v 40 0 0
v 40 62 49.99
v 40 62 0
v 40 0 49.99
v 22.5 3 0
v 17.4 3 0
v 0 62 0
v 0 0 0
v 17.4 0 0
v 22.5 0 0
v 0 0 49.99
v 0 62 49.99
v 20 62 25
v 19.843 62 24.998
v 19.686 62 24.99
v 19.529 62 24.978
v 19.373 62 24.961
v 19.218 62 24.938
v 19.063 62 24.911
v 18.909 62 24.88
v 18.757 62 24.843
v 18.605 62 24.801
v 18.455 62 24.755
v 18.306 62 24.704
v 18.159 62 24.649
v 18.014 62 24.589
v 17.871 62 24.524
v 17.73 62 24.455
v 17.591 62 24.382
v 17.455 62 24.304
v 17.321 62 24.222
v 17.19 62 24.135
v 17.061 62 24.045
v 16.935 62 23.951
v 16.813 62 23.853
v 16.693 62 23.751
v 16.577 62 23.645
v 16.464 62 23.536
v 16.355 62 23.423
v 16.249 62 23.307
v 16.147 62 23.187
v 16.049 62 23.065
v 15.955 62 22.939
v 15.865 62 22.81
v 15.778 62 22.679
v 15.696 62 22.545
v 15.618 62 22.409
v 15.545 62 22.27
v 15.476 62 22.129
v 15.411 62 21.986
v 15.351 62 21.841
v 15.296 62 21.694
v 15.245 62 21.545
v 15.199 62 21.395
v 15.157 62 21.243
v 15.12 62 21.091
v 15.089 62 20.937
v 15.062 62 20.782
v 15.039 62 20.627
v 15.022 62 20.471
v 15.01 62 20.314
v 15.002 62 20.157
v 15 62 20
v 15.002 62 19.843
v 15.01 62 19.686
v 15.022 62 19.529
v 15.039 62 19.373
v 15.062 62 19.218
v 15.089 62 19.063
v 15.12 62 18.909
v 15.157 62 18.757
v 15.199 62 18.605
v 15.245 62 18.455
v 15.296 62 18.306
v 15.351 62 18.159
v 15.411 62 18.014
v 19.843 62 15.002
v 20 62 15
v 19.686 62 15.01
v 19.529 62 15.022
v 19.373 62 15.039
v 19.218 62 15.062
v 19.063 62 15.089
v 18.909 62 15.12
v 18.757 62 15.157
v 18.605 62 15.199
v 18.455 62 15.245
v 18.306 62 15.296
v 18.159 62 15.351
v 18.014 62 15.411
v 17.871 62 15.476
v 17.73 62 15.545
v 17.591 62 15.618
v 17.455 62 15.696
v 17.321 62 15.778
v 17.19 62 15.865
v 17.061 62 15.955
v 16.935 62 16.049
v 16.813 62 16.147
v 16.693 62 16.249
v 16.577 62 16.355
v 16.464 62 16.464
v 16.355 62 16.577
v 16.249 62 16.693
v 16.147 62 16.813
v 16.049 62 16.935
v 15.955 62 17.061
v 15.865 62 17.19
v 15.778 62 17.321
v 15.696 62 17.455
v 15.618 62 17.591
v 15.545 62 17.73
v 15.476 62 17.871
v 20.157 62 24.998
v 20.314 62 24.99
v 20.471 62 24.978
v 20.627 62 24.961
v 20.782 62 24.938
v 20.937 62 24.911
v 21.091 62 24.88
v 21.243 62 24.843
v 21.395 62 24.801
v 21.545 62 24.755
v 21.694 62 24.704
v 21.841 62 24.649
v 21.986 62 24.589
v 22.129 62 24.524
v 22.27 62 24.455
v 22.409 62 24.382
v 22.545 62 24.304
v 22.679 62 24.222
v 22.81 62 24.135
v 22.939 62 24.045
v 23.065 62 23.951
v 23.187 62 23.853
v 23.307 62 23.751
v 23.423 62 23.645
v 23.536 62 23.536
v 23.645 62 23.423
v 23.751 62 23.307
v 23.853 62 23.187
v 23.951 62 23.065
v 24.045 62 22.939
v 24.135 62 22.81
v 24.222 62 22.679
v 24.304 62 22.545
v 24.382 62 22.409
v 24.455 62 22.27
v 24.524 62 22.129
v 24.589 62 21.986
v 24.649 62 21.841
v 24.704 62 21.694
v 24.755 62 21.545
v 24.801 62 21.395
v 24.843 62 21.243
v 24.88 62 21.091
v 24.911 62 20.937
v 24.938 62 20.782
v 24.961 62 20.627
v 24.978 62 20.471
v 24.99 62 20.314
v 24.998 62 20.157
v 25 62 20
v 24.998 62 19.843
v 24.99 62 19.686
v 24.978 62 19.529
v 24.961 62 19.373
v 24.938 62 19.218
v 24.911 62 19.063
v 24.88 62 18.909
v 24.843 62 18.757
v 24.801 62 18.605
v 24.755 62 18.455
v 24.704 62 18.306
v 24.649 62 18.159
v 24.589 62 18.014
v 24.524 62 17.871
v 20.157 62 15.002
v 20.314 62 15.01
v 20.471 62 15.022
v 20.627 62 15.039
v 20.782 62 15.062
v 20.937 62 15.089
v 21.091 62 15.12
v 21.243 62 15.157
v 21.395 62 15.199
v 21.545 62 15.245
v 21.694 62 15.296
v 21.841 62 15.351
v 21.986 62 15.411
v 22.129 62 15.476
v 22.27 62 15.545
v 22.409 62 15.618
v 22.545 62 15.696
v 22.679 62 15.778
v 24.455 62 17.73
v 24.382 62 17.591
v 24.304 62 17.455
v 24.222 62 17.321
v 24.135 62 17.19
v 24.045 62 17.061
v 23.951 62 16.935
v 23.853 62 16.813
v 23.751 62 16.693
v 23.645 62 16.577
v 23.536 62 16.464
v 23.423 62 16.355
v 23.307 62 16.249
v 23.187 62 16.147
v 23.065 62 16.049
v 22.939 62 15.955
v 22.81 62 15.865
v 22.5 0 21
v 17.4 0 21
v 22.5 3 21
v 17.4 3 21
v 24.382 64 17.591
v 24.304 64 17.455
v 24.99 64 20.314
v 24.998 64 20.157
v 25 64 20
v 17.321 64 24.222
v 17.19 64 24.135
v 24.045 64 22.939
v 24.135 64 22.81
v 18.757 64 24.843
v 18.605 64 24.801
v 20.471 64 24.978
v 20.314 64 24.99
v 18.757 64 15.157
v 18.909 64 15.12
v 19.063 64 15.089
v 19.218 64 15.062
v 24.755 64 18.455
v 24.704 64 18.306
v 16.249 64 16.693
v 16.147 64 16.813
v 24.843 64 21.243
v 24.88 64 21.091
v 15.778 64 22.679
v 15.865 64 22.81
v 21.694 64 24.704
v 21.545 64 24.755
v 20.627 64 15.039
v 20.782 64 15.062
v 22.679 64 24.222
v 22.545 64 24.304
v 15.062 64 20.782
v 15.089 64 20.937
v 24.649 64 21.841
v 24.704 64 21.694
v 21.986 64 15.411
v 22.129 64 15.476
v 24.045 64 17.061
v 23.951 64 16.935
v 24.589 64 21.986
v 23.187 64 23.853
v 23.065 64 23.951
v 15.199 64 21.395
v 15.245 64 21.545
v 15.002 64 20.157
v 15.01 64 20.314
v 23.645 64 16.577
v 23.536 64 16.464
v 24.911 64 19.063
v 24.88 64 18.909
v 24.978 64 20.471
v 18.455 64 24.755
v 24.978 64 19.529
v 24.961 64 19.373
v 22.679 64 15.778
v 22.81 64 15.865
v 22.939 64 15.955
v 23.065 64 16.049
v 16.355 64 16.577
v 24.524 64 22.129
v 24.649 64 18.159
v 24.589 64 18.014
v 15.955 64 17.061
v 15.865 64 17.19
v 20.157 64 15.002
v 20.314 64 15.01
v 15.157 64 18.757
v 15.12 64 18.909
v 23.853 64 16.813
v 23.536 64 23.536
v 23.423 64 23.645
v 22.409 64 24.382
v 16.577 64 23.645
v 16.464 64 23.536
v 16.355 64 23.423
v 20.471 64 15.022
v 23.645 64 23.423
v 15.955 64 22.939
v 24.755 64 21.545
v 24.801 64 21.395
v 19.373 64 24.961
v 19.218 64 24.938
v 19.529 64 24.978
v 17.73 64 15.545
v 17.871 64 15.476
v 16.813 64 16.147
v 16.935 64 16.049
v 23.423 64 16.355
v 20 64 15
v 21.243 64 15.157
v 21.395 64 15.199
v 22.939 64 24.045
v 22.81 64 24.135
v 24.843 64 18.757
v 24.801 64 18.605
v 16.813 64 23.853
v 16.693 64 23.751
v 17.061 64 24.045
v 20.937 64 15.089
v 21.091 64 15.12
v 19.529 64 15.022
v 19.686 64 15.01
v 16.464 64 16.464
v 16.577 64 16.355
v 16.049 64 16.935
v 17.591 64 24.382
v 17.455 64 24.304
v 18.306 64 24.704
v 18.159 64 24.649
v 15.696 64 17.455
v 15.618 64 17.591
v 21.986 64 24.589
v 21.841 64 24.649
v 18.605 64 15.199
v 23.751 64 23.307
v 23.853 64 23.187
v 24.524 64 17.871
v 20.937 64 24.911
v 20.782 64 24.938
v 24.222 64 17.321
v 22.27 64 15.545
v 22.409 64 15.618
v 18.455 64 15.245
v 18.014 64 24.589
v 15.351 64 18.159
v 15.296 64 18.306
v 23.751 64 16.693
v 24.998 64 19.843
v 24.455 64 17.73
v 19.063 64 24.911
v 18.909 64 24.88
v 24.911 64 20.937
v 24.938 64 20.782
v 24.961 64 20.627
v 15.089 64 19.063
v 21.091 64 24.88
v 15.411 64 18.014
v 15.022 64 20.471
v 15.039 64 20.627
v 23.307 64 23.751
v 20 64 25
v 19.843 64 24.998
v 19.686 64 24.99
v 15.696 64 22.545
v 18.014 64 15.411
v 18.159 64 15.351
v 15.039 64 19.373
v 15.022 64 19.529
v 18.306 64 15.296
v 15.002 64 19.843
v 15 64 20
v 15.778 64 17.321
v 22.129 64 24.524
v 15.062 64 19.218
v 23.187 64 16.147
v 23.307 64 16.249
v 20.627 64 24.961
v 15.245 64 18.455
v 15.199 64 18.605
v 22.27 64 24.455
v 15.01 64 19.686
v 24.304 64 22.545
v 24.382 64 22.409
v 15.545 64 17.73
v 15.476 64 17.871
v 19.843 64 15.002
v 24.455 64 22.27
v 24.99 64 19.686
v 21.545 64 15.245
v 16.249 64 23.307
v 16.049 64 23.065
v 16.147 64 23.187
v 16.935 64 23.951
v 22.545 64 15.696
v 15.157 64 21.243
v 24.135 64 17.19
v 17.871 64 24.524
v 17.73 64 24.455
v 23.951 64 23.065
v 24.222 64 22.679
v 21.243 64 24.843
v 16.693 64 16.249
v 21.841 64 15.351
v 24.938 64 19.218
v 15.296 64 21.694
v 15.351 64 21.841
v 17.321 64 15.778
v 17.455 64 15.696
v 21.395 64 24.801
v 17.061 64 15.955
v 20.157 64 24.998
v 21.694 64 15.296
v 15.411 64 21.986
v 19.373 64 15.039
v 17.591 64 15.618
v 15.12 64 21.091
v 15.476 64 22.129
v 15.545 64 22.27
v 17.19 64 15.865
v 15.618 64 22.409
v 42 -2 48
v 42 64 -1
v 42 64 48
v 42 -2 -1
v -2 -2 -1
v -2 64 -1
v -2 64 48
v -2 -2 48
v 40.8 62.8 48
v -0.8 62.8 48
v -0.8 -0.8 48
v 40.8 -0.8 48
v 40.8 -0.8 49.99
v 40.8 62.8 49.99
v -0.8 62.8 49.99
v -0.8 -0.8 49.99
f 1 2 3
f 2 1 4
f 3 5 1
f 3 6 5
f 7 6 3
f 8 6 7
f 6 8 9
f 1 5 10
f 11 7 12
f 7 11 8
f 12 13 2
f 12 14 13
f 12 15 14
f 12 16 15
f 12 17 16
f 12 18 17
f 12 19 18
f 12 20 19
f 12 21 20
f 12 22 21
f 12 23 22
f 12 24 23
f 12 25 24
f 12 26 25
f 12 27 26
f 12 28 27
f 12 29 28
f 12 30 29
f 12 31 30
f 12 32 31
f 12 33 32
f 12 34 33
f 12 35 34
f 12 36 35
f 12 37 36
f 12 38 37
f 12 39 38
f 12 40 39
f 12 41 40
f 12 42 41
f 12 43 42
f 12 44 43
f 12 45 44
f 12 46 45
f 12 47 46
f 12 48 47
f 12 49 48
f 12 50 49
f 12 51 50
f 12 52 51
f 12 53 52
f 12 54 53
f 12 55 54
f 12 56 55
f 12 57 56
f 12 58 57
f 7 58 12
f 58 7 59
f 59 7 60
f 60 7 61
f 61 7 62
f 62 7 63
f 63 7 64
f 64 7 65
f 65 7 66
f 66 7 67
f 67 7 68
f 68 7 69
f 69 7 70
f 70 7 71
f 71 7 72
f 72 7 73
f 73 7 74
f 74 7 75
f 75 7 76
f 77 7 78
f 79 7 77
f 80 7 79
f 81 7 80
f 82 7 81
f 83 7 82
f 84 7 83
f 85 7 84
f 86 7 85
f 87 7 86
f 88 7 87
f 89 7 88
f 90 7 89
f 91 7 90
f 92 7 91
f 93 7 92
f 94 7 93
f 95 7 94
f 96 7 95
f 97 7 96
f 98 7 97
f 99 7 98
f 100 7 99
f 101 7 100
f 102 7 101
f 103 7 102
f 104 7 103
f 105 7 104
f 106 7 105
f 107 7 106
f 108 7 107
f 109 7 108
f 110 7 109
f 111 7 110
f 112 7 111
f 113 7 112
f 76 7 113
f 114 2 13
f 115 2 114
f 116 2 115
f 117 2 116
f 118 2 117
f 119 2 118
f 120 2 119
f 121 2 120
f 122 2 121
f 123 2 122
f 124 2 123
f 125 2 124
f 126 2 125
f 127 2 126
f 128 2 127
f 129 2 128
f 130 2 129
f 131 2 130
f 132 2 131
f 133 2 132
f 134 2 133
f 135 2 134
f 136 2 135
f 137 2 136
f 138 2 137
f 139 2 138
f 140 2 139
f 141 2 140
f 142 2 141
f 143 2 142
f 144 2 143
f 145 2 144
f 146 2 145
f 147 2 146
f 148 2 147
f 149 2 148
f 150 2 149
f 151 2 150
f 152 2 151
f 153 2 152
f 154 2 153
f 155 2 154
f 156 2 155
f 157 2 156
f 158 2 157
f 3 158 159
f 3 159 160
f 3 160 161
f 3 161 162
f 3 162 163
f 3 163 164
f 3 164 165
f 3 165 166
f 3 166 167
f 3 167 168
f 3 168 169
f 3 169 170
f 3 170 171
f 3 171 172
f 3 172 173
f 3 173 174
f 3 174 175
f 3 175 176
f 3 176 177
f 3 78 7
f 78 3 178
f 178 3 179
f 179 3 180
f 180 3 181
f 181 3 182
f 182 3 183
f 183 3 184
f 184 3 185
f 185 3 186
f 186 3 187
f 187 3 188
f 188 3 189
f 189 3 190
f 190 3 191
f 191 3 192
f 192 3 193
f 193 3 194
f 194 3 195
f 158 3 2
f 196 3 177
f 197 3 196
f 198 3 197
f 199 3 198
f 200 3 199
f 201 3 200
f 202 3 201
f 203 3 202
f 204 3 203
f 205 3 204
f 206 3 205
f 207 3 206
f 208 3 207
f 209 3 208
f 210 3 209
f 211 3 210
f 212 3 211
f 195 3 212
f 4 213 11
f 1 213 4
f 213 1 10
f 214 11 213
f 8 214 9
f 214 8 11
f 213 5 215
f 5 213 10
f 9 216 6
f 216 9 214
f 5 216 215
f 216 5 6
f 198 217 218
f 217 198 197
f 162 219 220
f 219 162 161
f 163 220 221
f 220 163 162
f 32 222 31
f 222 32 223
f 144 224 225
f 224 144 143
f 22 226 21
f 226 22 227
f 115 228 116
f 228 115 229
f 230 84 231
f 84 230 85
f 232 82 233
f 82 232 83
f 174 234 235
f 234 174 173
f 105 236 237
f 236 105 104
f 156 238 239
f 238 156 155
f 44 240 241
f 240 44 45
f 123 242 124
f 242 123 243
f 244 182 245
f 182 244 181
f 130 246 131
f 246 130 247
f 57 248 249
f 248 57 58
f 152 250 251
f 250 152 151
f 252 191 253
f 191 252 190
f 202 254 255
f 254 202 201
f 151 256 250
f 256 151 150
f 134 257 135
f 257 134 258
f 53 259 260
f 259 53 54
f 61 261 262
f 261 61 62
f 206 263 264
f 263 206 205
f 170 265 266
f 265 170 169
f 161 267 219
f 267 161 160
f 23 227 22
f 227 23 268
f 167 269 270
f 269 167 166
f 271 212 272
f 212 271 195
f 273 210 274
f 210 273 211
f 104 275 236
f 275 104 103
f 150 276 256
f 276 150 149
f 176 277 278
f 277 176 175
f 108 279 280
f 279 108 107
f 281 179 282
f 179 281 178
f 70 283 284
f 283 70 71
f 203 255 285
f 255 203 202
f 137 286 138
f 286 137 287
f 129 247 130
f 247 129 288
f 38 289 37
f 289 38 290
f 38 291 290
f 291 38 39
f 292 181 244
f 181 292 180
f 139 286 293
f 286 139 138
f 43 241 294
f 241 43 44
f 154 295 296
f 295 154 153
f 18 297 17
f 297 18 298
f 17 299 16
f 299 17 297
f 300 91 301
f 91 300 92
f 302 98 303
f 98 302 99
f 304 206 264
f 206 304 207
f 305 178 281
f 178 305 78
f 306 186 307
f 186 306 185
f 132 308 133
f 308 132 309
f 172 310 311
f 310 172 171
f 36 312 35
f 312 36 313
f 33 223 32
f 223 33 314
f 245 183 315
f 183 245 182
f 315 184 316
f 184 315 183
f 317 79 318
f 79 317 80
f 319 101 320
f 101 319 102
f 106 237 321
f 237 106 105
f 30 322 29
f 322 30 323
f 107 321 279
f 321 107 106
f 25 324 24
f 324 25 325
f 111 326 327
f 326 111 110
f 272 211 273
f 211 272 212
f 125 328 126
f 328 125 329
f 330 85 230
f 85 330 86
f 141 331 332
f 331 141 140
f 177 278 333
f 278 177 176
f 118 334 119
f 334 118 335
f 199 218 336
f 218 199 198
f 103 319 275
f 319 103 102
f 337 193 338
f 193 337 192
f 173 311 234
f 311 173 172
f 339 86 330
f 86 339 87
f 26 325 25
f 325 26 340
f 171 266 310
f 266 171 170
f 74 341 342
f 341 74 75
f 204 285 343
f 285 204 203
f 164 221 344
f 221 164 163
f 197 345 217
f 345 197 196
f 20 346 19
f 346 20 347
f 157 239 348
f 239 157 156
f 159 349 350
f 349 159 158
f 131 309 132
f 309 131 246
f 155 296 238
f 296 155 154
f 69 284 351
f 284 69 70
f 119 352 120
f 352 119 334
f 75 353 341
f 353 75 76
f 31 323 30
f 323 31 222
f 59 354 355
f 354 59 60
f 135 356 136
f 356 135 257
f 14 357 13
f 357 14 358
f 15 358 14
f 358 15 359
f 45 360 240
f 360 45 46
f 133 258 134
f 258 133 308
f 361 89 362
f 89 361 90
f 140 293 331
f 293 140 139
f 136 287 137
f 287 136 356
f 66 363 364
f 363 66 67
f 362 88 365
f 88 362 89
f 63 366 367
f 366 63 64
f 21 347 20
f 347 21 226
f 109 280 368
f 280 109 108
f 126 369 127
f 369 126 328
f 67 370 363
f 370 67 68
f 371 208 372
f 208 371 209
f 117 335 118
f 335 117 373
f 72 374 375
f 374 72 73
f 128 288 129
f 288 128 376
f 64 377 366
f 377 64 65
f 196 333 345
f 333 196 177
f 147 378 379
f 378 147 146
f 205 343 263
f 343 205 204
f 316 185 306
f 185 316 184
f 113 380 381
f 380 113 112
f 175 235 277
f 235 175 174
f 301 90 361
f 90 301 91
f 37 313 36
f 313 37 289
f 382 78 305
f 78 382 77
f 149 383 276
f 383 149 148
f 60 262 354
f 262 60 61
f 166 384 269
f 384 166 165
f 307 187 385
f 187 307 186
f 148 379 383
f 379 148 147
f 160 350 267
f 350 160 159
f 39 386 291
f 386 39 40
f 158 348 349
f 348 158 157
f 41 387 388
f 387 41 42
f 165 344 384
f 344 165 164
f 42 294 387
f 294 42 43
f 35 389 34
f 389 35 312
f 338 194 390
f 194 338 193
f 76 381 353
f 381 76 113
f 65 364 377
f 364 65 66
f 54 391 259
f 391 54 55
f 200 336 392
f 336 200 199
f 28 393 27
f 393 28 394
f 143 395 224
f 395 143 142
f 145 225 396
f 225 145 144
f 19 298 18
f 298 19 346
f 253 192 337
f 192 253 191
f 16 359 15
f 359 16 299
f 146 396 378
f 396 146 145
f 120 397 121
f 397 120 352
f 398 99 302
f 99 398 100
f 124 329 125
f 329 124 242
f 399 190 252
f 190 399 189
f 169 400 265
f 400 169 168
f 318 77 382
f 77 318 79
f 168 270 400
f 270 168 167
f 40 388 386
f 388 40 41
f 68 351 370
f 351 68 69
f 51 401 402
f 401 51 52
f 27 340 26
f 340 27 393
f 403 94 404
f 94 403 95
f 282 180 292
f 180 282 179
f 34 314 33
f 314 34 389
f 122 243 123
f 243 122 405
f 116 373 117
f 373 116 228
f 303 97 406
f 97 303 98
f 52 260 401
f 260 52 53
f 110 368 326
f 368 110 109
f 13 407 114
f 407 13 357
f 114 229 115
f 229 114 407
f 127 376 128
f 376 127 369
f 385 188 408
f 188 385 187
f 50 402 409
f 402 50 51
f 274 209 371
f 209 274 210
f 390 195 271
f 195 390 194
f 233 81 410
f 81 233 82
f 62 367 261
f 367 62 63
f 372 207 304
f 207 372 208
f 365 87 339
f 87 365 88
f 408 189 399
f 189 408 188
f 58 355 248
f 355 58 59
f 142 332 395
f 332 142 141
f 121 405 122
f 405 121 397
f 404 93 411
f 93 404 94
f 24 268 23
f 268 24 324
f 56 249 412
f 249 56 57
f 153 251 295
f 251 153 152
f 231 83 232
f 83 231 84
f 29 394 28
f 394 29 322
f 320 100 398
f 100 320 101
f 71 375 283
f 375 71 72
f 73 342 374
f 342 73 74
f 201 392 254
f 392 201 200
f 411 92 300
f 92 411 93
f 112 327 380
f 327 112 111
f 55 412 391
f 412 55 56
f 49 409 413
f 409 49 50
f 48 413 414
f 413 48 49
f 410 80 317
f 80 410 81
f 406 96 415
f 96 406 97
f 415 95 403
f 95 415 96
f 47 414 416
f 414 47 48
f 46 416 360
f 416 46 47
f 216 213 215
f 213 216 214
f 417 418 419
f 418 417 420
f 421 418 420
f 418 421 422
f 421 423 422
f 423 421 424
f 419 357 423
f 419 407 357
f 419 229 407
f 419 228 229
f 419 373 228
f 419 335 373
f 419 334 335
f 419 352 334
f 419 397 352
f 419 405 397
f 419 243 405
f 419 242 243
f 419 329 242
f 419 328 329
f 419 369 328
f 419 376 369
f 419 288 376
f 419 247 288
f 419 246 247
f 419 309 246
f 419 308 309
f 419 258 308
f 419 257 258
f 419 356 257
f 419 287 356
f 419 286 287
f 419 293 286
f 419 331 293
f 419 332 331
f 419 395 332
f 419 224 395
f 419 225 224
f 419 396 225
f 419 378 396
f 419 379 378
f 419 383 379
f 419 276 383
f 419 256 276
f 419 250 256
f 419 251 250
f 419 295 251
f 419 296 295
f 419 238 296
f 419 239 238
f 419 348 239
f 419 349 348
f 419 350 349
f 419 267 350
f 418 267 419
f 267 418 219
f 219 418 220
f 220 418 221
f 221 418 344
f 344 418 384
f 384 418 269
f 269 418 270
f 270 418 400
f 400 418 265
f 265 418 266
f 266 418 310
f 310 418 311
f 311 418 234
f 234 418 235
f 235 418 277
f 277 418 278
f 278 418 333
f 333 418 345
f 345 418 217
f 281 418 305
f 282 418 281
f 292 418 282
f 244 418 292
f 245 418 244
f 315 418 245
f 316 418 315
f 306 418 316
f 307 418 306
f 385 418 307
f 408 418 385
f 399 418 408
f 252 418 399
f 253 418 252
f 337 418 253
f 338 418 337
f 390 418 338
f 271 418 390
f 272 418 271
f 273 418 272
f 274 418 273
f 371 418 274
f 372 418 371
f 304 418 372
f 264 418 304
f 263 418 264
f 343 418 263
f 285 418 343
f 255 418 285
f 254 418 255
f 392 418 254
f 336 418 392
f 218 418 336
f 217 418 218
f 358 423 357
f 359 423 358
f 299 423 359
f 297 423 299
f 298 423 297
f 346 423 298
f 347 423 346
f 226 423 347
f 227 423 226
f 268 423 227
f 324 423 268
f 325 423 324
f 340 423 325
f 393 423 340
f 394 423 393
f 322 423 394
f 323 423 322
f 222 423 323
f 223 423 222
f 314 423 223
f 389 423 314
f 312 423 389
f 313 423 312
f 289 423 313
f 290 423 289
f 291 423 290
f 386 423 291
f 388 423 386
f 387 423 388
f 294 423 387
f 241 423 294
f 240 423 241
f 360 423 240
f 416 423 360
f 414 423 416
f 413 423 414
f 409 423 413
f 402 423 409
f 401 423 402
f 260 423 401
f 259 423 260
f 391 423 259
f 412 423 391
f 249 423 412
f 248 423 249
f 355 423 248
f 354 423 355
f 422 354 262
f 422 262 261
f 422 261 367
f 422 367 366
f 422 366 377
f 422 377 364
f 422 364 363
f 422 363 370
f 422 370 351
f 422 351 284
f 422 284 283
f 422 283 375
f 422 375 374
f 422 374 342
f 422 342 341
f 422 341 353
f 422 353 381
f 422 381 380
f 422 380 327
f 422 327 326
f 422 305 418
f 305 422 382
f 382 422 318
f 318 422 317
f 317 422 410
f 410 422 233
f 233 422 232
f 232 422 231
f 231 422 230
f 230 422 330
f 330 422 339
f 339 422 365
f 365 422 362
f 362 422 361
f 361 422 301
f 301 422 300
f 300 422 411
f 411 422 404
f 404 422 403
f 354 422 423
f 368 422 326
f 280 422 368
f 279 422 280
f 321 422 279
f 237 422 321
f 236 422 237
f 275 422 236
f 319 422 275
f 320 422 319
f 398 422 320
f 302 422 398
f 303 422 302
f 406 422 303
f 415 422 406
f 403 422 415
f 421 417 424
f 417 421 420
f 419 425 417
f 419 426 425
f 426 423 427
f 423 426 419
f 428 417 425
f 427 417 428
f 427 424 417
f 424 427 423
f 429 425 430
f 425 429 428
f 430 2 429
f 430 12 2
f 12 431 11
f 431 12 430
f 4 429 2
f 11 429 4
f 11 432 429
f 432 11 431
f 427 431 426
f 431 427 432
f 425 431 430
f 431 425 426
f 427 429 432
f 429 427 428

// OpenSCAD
$fn=200;
epsilon=0.2;
top=false;
//lower
difference() {

//All
difference() {
translate([-2,-2,-1]) cube(size=[44,66,60]);

union() {
//Battery
difference() {
	cube(size=[40,62,21.1]);
	translate ([-0.1 + (40-5)/2, -0.1, -0.5]) cube(size=[5.1,3.1,22]);
}

//Powerplug
translate([40/2,63,20]) rotate([90,0,0]) cylinder(h=10,r=10/2,center=true);

//wire
translate([0,0,21]) cube(size=[40,62,21.1]);

//µC
translate([0,0,41]) difference() {
cube(size=[40,62,17]);
translate([40/2-15/2,-0.1,9]) cube(size=[15,30,1.5]);
}

//Switch
translate([40/2,45,60]) cylinder(h=10,r=9/2,center=true);


//LED
translate([40/2,55,60]) cylinder(h=10,r=5/2,center=true);
}
}

if(top) {
	translate([-30,-30,-52]) cube(size=[100,100,100]);
	translate([-1-epsilon,-1-epsilon,-50.01]) cube(size=[42+2*epsilon,64+2*epsilon,100]);
} else {
	difference() {
		translate([-60,-60,-60]) cube(size=[1000,1000,1000]);
		translate([-30,-30,-52]) cube(size=[100,100,100]);
		translate([-1+epsilon,-1+epsilon,-50.01]) cube(size=[42-2*epsilon,64-2*epsilon,100]);
	}
}
}
